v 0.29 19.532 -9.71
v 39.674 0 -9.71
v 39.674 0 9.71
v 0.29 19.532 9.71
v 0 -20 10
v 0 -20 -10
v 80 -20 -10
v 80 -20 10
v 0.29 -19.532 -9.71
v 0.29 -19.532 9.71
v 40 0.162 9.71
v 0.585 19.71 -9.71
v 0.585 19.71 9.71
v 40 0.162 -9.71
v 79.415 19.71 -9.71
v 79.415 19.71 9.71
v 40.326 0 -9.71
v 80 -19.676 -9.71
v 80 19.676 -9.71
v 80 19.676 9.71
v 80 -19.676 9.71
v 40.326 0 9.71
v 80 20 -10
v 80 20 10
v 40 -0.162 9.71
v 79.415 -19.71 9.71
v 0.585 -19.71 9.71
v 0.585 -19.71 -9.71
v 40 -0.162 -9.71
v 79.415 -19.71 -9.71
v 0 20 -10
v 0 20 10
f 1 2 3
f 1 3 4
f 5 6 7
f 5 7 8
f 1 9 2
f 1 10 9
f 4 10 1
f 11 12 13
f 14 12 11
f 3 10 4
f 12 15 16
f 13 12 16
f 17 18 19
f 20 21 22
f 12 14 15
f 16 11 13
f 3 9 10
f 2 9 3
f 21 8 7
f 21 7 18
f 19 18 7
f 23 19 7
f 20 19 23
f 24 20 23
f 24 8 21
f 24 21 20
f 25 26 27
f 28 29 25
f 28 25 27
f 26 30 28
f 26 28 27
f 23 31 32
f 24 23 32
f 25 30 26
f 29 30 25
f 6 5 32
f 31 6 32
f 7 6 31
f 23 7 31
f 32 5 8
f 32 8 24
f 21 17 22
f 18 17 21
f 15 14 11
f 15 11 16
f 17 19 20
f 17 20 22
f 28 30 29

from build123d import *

# Parameters (mm, degrees)
F0_W     = 40
F0_H     = 20
F2_DEPTH = 80
F3_T     = -0.29
F5_DEPTH = 20


with BuildPart() as f2:
    # F0 (on Right) → F2 (new body)
    with BuildSketch(Plane.YZ):
        Rectangle(F0_W, F0_H)
    extrude(amount=F2_DEPTH)

    # F3
    f3_openings = [f2.faces().sort_by_distance(p)[0] for p in [
        (80, 0, 0),
    ]]
    offset(amount=F3_T, openings=f3_openings)

    # F4 (on face) → F5 (join)
    with BuildSketch(Plane(origin=(0, 0, -10), x_dir=(1, 0, 0), z_dir=(0, 0, -1))):
        Polygon((39.6736521938, 0), (40, -0.1618533906), (40.3263478062, 0), (40, 0.1618533906), align=None)
        Polygon((40, 0.1618533906), (40.3263478062, 0), (80, 19.6762932188), (80, 20), align=None)
        Polygon((0, -19.6762932188), (0, -20), (40, -0.1618533906), (39.6736521938, 0), align=None)
        Polygon((0, 19.6762932188), (39.6736521938, 0), (40, 0.1618533906), (0, 20), align=None)
        Polygon((40.3263478062, 0), (40, -0.1618533906), (80, -20), (80, -19.6762932188), align=None)
    extrude(amount=-F5_DEPTH)


solid = f2.part
